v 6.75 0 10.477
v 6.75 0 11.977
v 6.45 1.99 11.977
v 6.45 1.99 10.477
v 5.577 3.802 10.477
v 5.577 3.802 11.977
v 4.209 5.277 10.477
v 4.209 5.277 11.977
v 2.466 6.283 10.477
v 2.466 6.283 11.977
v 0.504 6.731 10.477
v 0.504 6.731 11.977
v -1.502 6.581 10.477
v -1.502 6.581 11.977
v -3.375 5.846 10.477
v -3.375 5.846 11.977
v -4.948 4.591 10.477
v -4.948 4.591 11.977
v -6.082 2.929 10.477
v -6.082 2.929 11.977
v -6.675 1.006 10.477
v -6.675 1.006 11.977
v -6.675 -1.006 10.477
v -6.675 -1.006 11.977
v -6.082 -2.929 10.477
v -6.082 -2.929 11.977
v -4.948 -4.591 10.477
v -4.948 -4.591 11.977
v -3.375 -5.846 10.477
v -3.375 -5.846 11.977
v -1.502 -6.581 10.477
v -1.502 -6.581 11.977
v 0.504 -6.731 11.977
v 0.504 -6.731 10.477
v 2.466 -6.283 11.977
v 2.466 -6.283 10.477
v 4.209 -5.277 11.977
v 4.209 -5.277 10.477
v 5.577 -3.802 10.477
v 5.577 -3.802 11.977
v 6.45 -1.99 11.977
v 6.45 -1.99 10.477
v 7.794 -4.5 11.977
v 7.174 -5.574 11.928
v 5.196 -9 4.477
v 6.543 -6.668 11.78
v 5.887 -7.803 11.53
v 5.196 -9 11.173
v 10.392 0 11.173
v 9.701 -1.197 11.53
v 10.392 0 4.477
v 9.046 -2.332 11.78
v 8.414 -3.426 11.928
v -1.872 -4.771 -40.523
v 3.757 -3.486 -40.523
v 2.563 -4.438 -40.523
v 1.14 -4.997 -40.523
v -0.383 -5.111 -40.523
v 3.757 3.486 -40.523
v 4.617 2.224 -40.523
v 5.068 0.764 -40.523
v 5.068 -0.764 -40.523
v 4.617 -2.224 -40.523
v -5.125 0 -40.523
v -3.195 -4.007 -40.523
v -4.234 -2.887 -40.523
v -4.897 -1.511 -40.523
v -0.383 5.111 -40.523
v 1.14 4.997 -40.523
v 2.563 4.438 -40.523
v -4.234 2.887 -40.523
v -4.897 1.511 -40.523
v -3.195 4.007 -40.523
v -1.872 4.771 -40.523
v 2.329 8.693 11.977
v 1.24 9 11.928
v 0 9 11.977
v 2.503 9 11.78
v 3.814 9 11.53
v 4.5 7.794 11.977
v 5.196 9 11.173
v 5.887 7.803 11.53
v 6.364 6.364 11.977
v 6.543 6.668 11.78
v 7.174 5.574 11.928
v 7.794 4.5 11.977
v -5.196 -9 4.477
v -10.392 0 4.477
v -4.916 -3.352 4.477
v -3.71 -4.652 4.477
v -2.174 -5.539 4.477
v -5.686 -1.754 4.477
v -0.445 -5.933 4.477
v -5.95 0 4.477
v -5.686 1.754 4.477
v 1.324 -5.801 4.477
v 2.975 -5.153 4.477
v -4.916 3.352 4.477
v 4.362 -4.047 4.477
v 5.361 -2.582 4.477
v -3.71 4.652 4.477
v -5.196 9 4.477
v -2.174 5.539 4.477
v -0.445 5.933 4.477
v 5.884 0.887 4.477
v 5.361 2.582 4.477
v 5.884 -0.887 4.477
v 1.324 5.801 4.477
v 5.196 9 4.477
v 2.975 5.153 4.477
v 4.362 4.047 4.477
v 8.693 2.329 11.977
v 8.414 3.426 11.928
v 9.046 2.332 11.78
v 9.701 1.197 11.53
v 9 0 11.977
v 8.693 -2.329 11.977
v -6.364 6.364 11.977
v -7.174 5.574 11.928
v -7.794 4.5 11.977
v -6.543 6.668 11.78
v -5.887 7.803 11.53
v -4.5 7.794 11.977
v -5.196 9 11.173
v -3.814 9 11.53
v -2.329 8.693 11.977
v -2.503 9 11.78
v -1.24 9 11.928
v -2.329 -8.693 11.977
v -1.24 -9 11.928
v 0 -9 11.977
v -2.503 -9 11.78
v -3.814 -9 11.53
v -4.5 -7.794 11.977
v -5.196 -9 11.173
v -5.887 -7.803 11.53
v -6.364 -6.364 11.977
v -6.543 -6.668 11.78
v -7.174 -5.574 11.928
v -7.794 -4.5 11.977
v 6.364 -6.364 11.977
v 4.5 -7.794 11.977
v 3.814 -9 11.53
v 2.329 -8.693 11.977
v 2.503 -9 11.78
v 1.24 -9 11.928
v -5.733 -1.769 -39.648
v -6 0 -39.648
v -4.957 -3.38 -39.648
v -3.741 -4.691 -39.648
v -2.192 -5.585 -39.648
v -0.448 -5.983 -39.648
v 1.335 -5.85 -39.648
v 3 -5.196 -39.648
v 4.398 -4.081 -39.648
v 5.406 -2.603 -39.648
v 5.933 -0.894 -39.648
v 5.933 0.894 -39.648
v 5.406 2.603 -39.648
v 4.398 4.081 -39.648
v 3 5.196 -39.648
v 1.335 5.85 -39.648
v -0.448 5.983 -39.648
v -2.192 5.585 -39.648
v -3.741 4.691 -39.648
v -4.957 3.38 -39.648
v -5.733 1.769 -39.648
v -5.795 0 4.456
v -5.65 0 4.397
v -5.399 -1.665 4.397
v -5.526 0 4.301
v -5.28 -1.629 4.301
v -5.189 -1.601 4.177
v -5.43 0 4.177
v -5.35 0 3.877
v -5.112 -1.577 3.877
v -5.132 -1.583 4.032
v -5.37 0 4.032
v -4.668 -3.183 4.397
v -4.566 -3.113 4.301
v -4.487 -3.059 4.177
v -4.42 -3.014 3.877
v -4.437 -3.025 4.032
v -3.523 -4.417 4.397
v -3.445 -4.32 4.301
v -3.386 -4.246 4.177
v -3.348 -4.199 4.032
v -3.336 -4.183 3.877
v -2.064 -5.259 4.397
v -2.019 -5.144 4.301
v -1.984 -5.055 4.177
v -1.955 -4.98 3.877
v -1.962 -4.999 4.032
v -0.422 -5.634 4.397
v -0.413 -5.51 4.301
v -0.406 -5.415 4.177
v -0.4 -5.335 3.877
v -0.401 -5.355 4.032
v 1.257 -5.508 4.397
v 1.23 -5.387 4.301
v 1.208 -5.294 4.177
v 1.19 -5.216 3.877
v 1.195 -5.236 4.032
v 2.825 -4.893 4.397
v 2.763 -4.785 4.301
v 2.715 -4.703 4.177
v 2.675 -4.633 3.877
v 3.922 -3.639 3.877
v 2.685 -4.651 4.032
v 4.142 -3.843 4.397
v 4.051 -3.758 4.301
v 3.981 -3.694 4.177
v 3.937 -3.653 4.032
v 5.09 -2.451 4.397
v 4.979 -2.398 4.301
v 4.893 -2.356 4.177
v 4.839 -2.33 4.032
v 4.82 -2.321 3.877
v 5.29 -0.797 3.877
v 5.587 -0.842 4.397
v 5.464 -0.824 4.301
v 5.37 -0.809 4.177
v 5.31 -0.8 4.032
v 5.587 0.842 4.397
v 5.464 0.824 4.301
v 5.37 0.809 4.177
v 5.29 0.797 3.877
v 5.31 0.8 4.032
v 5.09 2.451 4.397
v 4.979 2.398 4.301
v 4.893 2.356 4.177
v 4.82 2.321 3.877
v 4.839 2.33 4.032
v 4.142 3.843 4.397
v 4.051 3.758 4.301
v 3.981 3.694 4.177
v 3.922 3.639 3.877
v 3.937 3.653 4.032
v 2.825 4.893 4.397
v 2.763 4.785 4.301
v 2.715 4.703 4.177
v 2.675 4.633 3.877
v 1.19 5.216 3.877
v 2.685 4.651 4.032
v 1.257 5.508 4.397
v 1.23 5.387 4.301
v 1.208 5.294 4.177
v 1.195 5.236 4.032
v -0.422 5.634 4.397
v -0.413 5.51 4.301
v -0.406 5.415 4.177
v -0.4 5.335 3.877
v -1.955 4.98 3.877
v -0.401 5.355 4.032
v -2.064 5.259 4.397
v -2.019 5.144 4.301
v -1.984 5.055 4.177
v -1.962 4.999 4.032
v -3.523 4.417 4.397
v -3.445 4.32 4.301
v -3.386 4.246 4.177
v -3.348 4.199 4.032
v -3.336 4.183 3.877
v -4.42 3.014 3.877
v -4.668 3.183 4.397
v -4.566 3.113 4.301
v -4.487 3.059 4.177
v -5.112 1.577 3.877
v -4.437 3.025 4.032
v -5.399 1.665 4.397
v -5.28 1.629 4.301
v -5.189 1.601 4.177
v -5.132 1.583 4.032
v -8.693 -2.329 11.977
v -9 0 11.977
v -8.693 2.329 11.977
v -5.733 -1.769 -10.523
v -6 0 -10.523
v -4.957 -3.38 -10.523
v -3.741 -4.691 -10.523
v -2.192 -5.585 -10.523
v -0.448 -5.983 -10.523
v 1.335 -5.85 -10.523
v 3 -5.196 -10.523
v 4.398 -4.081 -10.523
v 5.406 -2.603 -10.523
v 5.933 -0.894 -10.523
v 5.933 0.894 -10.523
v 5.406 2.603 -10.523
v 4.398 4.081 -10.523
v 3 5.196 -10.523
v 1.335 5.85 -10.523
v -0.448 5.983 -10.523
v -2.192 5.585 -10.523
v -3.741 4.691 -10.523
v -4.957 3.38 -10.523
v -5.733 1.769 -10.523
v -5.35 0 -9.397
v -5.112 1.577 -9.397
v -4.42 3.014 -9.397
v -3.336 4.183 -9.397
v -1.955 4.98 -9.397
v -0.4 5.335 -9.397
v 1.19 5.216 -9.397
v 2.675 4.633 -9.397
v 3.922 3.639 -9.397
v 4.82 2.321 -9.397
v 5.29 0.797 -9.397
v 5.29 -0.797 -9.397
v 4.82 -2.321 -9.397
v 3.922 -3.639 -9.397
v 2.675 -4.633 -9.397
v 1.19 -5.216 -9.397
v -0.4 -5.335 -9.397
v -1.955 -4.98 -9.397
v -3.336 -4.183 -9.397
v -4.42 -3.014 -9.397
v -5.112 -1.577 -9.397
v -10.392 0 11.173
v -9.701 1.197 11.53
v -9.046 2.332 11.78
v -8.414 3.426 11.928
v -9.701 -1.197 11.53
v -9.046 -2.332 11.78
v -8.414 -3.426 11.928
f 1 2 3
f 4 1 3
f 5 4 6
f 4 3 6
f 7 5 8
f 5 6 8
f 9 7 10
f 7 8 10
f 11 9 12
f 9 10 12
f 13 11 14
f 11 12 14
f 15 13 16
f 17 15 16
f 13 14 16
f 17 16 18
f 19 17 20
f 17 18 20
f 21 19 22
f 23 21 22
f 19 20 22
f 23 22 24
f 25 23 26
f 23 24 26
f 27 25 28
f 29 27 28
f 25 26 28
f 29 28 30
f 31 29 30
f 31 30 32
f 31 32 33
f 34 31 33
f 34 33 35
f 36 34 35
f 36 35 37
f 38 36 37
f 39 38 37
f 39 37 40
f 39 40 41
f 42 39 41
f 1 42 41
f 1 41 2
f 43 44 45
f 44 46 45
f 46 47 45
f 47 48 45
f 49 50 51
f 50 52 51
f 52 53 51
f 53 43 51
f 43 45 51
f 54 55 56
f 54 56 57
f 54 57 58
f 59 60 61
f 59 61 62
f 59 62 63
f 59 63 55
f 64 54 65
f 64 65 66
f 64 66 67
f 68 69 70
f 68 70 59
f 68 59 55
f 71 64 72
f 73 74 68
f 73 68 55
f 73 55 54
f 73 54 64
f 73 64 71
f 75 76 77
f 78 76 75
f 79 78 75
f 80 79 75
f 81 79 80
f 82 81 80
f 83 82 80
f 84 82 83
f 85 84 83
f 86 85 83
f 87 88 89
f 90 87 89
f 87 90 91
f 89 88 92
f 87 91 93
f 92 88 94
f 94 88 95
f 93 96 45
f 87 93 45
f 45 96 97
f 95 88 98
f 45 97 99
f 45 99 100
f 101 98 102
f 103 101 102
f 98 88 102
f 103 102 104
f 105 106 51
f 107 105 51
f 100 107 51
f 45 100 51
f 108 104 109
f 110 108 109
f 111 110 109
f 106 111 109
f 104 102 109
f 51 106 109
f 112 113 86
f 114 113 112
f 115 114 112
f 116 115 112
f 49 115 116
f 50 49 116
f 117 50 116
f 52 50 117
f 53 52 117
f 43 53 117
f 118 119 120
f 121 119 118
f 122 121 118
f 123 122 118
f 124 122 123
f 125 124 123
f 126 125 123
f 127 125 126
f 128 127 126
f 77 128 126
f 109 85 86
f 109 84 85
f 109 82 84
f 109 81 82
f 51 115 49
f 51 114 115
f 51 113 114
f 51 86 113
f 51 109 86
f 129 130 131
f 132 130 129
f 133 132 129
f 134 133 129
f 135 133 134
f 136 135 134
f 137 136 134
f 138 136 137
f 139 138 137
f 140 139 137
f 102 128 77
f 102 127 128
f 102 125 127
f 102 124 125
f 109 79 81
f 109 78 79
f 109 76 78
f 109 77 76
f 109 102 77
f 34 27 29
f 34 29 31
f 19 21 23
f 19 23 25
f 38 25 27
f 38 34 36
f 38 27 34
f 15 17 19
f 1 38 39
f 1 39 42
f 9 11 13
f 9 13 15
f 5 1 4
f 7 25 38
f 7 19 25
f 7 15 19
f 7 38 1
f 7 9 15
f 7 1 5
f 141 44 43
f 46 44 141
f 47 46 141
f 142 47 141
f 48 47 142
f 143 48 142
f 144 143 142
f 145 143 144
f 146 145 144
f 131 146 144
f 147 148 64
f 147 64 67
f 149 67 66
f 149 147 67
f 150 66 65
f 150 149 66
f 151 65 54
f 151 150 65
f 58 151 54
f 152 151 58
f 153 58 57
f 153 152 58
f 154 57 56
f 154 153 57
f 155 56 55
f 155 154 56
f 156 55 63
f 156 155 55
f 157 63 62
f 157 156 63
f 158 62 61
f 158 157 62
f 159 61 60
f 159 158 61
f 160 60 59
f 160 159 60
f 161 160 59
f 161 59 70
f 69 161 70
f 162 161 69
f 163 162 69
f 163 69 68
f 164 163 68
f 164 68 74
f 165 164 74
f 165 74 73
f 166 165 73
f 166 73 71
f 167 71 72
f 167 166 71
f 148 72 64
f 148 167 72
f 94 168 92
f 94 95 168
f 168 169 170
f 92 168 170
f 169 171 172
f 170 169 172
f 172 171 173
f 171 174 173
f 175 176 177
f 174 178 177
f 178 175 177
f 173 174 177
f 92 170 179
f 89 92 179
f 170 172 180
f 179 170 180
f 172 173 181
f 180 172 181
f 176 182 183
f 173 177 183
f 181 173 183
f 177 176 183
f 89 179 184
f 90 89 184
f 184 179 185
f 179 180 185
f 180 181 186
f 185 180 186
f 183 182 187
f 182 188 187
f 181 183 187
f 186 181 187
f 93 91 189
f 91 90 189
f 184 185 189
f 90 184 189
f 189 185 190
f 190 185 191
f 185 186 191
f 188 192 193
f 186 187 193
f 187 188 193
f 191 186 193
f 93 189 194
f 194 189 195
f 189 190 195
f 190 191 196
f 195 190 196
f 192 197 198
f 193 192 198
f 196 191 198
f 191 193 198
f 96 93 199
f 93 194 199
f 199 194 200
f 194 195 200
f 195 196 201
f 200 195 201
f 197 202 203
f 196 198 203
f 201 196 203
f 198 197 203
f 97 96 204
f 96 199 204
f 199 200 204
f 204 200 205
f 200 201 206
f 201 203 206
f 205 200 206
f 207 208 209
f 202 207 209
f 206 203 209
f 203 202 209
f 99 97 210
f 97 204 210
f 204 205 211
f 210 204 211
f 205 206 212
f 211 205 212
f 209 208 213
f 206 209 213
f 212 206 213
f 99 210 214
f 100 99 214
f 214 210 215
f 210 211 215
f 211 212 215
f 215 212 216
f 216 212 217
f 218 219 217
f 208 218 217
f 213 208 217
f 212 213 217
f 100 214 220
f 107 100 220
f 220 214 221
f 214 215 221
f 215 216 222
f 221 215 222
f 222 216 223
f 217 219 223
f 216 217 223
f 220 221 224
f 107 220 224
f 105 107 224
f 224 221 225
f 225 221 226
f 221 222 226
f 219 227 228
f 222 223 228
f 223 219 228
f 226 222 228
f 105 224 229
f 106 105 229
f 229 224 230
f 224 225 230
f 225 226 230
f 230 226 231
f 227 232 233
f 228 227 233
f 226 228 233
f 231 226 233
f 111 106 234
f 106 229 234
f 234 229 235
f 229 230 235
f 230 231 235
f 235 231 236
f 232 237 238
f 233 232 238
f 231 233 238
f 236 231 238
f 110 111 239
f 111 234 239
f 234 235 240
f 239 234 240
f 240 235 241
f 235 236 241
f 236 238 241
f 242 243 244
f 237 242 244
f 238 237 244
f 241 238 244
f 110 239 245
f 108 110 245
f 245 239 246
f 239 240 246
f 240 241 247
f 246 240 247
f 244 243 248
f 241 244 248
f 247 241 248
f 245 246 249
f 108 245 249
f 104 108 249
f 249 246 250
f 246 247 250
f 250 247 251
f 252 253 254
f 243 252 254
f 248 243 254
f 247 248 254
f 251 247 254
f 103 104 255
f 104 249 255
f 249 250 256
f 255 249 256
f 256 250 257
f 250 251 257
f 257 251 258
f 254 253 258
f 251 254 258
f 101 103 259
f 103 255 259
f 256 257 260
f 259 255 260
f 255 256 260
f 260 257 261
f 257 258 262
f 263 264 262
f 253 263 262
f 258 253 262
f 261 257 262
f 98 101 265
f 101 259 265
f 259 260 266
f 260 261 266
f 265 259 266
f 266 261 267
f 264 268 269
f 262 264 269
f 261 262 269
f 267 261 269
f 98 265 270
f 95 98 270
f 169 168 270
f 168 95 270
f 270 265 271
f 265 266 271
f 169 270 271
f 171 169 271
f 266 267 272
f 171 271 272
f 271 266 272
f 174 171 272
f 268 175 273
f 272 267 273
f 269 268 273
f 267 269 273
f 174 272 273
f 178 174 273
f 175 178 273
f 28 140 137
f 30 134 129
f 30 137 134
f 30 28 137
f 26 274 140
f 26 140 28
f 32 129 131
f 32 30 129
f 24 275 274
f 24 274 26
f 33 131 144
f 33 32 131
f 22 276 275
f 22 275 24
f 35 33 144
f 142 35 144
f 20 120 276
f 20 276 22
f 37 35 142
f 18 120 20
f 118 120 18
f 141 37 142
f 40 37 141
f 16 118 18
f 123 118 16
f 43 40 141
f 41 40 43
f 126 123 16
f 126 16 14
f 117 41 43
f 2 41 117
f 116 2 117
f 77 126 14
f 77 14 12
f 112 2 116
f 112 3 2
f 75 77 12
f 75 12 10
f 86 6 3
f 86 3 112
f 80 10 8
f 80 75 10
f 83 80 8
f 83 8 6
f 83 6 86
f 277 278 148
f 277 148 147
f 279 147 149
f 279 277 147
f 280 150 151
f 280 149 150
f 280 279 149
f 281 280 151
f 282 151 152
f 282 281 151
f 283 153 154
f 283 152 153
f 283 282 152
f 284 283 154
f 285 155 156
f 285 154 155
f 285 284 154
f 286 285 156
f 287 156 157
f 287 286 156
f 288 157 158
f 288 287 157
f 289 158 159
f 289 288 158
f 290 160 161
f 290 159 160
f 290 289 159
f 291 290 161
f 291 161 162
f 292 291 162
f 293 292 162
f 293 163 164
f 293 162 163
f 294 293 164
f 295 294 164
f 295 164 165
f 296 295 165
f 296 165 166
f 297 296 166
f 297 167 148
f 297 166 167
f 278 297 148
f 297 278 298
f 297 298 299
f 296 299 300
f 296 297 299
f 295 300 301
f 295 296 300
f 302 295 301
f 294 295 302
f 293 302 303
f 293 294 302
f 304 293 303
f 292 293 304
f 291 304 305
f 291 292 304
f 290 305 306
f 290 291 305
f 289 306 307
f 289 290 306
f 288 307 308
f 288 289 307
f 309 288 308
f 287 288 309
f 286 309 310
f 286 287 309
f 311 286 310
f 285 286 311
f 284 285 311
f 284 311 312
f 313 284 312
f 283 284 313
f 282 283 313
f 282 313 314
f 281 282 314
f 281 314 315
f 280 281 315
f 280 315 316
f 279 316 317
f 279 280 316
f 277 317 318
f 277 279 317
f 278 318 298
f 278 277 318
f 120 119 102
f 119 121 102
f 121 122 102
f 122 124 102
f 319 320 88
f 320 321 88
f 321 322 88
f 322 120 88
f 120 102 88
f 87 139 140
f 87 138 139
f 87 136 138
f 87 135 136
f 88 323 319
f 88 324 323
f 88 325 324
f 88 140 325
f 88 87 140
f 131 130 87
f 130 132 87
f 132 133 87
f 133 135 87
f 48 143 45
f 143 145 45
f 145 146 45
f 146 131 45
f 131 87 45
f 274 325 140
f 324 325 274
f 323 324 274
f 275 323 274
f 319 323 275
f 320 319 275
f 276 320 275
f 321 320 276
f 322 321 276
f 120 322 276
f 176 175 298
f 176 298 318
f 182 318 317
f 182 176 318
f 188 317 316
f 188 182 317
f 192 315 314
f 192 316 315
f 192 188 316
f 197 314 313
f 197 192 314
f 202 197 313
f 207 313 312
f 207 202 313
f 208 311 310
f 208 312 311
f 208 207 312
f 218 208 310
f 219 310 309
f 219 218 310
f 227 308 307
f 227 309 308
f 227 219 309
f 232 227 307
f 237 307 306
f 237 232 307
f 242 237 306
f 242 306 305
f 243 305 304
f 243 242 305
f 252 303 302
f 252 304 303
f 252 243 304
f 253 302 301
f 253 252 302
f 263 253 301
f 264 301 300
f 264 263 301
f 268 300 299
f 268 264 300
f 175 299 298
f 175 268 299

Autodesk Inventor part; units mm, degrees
ref_plane "YZ Plane" through (0, 0, 0) normal (1, 0, 0) x (0, 1, 0)
sketch "Sketch2" plane through (0, 0, 0) normal (0, 1, 0) x (-1, 0, 0)
  line L0 (0, 4.4769) -> (0, -40.5231)
  line L1 (0, -40.5231) -> (5.125, -40.5231)
  line L2 (6, -39.6481) -> (6, -10.5231)
  line L3 (6, -10.5231) -> (5.35, -9.3972)
  line L4 (5.35, -9.3972) -> (5.35, 4.4769)
  line L5 (5.35, 4.4769) -> (0, 4.4769)
  line L6 (5.125, -40.5231) -> (6, -39.6481)
  line L7 (6, -40.5231) -> (6, -41.7605)
  line L8 (0, -51.008) -> (0, 13.7244) projected
  dimension "Ds" = 10.7
  dimension "NND" = 12
  dimension "b" = 30
  dimension "d3" = 30
  dimension "d5" = 45
  dimension "PTC" = 1.75
  dimension "NLG" = 45
revolve "Revolution1" add sketch "Sketch2" angle 360 about axis through (0, 0, 4.4769) along (0, 0, -1)
sketch "Sketch3" plane through (0, 0, 4.4769) normal (0, 0, 1) x (1, 0, 0)
  circle A0 centre (0, 0) radius 5.35 projected
  line L0 (0, 9) -> (5.1962, 9)
  line L1 (5.1962, 9) -> (10.3923, 0)
  line L2 (10.3923, 0) -> (0, 0)
  line L3 (0, 0) -> (0, 9)
  line L4 (0, 9) -> (-5.1962, 9)
  line L5 (-5.1962, 9) -> (-10.3923, 0)
  line L6 (0, -9) -> (5.1962, -9)
  line L7 (5.1962, -9) -> (10.3923, 0)
  line L8 (-5.1962, -9) -> (-10.3923, 0)
  line L9 (0, -9) -> (-5.1962, -9)
  dimension "d9" = 60
  dimension "ParS" = 18
  dimension "msp_d11" = 18
extrude "Extrusion1" add sketch "Sketch3" along normal blind 7.5
sketch "Sketch4" plane through (0, 0, 0) normal (0, 1, 0) x (-1, 0, 0)
  line L0 (-9, 11.9769) -> (-10.3923, 11.9769)
  line L1 (-10.3923, 11.9769) -> (-10.3923, 11.1731)
  line L2 (-10.3923, 11.1731) -> (-9, 11.9769)
  line L3 (0, -0.2242) -> (0, 32.6837) projected
  line L4 (0, 27.9826) -> (0, 27.1787)
  line L5 (-10.3923, 4.4769) -> (-10.3923, 11.9769) projected
  line L6 (-5.1962, 11.9769) -> (-10.3923, 11.9769) projected
  dimension "d14" = 30
  dimension "msp_d15" = 18
revolve "Revolution2" cut sketch "Sketch4" angle 360 about axis through (0, 0, 27.9826) along (0, 0, -1)
sketch "Sketch5" plane through (0, 0, 11.9769) normal (0, 0, 1) x (1, 0, 0)
  arc A0 (7.7942, 4.5) -> (0, 9) centre (0, 0) ccw projected
  circle A1 centre (0, 0) radius 6.75
  dimension "d27" = 13.5
extrude "Extrusion2" cut sketch "Sketch5" against normal blind 1.5
thread "Thread1" size "M12x1.75" class "6g" standard "ISO Metric profile" full length
ref_plane "MSC_PF1" through (0, 0, 0) normal (0, 1, 0) x (-1, 0, 0)
ref_plane "MSC_PT1" through (0, 0, 4.4769) normal (0, 0, -1) x (-1, 0, 0)
fillet "Fillet1" radius 0.6 1 edges at (5.35, 0, 4.4769)
equation "\"msp_d11\" = ParS"
equation "\"msp_d15\" = ParS"
equation "\"d27\" = 0.75 * ParS"
equation "\"d28\" = 0.2 * ParK"
equation "\"d30\" = r"
equation "\"msp_d17\" = b"
equation "\"r\" = 0.6"
equation "\"THREADDIA\" = NND"
equation "\"ParK\" = 7.5"
properties part number "DIN EN ISO 4015 - M12x45" material "Stainless Steel, 440C"
